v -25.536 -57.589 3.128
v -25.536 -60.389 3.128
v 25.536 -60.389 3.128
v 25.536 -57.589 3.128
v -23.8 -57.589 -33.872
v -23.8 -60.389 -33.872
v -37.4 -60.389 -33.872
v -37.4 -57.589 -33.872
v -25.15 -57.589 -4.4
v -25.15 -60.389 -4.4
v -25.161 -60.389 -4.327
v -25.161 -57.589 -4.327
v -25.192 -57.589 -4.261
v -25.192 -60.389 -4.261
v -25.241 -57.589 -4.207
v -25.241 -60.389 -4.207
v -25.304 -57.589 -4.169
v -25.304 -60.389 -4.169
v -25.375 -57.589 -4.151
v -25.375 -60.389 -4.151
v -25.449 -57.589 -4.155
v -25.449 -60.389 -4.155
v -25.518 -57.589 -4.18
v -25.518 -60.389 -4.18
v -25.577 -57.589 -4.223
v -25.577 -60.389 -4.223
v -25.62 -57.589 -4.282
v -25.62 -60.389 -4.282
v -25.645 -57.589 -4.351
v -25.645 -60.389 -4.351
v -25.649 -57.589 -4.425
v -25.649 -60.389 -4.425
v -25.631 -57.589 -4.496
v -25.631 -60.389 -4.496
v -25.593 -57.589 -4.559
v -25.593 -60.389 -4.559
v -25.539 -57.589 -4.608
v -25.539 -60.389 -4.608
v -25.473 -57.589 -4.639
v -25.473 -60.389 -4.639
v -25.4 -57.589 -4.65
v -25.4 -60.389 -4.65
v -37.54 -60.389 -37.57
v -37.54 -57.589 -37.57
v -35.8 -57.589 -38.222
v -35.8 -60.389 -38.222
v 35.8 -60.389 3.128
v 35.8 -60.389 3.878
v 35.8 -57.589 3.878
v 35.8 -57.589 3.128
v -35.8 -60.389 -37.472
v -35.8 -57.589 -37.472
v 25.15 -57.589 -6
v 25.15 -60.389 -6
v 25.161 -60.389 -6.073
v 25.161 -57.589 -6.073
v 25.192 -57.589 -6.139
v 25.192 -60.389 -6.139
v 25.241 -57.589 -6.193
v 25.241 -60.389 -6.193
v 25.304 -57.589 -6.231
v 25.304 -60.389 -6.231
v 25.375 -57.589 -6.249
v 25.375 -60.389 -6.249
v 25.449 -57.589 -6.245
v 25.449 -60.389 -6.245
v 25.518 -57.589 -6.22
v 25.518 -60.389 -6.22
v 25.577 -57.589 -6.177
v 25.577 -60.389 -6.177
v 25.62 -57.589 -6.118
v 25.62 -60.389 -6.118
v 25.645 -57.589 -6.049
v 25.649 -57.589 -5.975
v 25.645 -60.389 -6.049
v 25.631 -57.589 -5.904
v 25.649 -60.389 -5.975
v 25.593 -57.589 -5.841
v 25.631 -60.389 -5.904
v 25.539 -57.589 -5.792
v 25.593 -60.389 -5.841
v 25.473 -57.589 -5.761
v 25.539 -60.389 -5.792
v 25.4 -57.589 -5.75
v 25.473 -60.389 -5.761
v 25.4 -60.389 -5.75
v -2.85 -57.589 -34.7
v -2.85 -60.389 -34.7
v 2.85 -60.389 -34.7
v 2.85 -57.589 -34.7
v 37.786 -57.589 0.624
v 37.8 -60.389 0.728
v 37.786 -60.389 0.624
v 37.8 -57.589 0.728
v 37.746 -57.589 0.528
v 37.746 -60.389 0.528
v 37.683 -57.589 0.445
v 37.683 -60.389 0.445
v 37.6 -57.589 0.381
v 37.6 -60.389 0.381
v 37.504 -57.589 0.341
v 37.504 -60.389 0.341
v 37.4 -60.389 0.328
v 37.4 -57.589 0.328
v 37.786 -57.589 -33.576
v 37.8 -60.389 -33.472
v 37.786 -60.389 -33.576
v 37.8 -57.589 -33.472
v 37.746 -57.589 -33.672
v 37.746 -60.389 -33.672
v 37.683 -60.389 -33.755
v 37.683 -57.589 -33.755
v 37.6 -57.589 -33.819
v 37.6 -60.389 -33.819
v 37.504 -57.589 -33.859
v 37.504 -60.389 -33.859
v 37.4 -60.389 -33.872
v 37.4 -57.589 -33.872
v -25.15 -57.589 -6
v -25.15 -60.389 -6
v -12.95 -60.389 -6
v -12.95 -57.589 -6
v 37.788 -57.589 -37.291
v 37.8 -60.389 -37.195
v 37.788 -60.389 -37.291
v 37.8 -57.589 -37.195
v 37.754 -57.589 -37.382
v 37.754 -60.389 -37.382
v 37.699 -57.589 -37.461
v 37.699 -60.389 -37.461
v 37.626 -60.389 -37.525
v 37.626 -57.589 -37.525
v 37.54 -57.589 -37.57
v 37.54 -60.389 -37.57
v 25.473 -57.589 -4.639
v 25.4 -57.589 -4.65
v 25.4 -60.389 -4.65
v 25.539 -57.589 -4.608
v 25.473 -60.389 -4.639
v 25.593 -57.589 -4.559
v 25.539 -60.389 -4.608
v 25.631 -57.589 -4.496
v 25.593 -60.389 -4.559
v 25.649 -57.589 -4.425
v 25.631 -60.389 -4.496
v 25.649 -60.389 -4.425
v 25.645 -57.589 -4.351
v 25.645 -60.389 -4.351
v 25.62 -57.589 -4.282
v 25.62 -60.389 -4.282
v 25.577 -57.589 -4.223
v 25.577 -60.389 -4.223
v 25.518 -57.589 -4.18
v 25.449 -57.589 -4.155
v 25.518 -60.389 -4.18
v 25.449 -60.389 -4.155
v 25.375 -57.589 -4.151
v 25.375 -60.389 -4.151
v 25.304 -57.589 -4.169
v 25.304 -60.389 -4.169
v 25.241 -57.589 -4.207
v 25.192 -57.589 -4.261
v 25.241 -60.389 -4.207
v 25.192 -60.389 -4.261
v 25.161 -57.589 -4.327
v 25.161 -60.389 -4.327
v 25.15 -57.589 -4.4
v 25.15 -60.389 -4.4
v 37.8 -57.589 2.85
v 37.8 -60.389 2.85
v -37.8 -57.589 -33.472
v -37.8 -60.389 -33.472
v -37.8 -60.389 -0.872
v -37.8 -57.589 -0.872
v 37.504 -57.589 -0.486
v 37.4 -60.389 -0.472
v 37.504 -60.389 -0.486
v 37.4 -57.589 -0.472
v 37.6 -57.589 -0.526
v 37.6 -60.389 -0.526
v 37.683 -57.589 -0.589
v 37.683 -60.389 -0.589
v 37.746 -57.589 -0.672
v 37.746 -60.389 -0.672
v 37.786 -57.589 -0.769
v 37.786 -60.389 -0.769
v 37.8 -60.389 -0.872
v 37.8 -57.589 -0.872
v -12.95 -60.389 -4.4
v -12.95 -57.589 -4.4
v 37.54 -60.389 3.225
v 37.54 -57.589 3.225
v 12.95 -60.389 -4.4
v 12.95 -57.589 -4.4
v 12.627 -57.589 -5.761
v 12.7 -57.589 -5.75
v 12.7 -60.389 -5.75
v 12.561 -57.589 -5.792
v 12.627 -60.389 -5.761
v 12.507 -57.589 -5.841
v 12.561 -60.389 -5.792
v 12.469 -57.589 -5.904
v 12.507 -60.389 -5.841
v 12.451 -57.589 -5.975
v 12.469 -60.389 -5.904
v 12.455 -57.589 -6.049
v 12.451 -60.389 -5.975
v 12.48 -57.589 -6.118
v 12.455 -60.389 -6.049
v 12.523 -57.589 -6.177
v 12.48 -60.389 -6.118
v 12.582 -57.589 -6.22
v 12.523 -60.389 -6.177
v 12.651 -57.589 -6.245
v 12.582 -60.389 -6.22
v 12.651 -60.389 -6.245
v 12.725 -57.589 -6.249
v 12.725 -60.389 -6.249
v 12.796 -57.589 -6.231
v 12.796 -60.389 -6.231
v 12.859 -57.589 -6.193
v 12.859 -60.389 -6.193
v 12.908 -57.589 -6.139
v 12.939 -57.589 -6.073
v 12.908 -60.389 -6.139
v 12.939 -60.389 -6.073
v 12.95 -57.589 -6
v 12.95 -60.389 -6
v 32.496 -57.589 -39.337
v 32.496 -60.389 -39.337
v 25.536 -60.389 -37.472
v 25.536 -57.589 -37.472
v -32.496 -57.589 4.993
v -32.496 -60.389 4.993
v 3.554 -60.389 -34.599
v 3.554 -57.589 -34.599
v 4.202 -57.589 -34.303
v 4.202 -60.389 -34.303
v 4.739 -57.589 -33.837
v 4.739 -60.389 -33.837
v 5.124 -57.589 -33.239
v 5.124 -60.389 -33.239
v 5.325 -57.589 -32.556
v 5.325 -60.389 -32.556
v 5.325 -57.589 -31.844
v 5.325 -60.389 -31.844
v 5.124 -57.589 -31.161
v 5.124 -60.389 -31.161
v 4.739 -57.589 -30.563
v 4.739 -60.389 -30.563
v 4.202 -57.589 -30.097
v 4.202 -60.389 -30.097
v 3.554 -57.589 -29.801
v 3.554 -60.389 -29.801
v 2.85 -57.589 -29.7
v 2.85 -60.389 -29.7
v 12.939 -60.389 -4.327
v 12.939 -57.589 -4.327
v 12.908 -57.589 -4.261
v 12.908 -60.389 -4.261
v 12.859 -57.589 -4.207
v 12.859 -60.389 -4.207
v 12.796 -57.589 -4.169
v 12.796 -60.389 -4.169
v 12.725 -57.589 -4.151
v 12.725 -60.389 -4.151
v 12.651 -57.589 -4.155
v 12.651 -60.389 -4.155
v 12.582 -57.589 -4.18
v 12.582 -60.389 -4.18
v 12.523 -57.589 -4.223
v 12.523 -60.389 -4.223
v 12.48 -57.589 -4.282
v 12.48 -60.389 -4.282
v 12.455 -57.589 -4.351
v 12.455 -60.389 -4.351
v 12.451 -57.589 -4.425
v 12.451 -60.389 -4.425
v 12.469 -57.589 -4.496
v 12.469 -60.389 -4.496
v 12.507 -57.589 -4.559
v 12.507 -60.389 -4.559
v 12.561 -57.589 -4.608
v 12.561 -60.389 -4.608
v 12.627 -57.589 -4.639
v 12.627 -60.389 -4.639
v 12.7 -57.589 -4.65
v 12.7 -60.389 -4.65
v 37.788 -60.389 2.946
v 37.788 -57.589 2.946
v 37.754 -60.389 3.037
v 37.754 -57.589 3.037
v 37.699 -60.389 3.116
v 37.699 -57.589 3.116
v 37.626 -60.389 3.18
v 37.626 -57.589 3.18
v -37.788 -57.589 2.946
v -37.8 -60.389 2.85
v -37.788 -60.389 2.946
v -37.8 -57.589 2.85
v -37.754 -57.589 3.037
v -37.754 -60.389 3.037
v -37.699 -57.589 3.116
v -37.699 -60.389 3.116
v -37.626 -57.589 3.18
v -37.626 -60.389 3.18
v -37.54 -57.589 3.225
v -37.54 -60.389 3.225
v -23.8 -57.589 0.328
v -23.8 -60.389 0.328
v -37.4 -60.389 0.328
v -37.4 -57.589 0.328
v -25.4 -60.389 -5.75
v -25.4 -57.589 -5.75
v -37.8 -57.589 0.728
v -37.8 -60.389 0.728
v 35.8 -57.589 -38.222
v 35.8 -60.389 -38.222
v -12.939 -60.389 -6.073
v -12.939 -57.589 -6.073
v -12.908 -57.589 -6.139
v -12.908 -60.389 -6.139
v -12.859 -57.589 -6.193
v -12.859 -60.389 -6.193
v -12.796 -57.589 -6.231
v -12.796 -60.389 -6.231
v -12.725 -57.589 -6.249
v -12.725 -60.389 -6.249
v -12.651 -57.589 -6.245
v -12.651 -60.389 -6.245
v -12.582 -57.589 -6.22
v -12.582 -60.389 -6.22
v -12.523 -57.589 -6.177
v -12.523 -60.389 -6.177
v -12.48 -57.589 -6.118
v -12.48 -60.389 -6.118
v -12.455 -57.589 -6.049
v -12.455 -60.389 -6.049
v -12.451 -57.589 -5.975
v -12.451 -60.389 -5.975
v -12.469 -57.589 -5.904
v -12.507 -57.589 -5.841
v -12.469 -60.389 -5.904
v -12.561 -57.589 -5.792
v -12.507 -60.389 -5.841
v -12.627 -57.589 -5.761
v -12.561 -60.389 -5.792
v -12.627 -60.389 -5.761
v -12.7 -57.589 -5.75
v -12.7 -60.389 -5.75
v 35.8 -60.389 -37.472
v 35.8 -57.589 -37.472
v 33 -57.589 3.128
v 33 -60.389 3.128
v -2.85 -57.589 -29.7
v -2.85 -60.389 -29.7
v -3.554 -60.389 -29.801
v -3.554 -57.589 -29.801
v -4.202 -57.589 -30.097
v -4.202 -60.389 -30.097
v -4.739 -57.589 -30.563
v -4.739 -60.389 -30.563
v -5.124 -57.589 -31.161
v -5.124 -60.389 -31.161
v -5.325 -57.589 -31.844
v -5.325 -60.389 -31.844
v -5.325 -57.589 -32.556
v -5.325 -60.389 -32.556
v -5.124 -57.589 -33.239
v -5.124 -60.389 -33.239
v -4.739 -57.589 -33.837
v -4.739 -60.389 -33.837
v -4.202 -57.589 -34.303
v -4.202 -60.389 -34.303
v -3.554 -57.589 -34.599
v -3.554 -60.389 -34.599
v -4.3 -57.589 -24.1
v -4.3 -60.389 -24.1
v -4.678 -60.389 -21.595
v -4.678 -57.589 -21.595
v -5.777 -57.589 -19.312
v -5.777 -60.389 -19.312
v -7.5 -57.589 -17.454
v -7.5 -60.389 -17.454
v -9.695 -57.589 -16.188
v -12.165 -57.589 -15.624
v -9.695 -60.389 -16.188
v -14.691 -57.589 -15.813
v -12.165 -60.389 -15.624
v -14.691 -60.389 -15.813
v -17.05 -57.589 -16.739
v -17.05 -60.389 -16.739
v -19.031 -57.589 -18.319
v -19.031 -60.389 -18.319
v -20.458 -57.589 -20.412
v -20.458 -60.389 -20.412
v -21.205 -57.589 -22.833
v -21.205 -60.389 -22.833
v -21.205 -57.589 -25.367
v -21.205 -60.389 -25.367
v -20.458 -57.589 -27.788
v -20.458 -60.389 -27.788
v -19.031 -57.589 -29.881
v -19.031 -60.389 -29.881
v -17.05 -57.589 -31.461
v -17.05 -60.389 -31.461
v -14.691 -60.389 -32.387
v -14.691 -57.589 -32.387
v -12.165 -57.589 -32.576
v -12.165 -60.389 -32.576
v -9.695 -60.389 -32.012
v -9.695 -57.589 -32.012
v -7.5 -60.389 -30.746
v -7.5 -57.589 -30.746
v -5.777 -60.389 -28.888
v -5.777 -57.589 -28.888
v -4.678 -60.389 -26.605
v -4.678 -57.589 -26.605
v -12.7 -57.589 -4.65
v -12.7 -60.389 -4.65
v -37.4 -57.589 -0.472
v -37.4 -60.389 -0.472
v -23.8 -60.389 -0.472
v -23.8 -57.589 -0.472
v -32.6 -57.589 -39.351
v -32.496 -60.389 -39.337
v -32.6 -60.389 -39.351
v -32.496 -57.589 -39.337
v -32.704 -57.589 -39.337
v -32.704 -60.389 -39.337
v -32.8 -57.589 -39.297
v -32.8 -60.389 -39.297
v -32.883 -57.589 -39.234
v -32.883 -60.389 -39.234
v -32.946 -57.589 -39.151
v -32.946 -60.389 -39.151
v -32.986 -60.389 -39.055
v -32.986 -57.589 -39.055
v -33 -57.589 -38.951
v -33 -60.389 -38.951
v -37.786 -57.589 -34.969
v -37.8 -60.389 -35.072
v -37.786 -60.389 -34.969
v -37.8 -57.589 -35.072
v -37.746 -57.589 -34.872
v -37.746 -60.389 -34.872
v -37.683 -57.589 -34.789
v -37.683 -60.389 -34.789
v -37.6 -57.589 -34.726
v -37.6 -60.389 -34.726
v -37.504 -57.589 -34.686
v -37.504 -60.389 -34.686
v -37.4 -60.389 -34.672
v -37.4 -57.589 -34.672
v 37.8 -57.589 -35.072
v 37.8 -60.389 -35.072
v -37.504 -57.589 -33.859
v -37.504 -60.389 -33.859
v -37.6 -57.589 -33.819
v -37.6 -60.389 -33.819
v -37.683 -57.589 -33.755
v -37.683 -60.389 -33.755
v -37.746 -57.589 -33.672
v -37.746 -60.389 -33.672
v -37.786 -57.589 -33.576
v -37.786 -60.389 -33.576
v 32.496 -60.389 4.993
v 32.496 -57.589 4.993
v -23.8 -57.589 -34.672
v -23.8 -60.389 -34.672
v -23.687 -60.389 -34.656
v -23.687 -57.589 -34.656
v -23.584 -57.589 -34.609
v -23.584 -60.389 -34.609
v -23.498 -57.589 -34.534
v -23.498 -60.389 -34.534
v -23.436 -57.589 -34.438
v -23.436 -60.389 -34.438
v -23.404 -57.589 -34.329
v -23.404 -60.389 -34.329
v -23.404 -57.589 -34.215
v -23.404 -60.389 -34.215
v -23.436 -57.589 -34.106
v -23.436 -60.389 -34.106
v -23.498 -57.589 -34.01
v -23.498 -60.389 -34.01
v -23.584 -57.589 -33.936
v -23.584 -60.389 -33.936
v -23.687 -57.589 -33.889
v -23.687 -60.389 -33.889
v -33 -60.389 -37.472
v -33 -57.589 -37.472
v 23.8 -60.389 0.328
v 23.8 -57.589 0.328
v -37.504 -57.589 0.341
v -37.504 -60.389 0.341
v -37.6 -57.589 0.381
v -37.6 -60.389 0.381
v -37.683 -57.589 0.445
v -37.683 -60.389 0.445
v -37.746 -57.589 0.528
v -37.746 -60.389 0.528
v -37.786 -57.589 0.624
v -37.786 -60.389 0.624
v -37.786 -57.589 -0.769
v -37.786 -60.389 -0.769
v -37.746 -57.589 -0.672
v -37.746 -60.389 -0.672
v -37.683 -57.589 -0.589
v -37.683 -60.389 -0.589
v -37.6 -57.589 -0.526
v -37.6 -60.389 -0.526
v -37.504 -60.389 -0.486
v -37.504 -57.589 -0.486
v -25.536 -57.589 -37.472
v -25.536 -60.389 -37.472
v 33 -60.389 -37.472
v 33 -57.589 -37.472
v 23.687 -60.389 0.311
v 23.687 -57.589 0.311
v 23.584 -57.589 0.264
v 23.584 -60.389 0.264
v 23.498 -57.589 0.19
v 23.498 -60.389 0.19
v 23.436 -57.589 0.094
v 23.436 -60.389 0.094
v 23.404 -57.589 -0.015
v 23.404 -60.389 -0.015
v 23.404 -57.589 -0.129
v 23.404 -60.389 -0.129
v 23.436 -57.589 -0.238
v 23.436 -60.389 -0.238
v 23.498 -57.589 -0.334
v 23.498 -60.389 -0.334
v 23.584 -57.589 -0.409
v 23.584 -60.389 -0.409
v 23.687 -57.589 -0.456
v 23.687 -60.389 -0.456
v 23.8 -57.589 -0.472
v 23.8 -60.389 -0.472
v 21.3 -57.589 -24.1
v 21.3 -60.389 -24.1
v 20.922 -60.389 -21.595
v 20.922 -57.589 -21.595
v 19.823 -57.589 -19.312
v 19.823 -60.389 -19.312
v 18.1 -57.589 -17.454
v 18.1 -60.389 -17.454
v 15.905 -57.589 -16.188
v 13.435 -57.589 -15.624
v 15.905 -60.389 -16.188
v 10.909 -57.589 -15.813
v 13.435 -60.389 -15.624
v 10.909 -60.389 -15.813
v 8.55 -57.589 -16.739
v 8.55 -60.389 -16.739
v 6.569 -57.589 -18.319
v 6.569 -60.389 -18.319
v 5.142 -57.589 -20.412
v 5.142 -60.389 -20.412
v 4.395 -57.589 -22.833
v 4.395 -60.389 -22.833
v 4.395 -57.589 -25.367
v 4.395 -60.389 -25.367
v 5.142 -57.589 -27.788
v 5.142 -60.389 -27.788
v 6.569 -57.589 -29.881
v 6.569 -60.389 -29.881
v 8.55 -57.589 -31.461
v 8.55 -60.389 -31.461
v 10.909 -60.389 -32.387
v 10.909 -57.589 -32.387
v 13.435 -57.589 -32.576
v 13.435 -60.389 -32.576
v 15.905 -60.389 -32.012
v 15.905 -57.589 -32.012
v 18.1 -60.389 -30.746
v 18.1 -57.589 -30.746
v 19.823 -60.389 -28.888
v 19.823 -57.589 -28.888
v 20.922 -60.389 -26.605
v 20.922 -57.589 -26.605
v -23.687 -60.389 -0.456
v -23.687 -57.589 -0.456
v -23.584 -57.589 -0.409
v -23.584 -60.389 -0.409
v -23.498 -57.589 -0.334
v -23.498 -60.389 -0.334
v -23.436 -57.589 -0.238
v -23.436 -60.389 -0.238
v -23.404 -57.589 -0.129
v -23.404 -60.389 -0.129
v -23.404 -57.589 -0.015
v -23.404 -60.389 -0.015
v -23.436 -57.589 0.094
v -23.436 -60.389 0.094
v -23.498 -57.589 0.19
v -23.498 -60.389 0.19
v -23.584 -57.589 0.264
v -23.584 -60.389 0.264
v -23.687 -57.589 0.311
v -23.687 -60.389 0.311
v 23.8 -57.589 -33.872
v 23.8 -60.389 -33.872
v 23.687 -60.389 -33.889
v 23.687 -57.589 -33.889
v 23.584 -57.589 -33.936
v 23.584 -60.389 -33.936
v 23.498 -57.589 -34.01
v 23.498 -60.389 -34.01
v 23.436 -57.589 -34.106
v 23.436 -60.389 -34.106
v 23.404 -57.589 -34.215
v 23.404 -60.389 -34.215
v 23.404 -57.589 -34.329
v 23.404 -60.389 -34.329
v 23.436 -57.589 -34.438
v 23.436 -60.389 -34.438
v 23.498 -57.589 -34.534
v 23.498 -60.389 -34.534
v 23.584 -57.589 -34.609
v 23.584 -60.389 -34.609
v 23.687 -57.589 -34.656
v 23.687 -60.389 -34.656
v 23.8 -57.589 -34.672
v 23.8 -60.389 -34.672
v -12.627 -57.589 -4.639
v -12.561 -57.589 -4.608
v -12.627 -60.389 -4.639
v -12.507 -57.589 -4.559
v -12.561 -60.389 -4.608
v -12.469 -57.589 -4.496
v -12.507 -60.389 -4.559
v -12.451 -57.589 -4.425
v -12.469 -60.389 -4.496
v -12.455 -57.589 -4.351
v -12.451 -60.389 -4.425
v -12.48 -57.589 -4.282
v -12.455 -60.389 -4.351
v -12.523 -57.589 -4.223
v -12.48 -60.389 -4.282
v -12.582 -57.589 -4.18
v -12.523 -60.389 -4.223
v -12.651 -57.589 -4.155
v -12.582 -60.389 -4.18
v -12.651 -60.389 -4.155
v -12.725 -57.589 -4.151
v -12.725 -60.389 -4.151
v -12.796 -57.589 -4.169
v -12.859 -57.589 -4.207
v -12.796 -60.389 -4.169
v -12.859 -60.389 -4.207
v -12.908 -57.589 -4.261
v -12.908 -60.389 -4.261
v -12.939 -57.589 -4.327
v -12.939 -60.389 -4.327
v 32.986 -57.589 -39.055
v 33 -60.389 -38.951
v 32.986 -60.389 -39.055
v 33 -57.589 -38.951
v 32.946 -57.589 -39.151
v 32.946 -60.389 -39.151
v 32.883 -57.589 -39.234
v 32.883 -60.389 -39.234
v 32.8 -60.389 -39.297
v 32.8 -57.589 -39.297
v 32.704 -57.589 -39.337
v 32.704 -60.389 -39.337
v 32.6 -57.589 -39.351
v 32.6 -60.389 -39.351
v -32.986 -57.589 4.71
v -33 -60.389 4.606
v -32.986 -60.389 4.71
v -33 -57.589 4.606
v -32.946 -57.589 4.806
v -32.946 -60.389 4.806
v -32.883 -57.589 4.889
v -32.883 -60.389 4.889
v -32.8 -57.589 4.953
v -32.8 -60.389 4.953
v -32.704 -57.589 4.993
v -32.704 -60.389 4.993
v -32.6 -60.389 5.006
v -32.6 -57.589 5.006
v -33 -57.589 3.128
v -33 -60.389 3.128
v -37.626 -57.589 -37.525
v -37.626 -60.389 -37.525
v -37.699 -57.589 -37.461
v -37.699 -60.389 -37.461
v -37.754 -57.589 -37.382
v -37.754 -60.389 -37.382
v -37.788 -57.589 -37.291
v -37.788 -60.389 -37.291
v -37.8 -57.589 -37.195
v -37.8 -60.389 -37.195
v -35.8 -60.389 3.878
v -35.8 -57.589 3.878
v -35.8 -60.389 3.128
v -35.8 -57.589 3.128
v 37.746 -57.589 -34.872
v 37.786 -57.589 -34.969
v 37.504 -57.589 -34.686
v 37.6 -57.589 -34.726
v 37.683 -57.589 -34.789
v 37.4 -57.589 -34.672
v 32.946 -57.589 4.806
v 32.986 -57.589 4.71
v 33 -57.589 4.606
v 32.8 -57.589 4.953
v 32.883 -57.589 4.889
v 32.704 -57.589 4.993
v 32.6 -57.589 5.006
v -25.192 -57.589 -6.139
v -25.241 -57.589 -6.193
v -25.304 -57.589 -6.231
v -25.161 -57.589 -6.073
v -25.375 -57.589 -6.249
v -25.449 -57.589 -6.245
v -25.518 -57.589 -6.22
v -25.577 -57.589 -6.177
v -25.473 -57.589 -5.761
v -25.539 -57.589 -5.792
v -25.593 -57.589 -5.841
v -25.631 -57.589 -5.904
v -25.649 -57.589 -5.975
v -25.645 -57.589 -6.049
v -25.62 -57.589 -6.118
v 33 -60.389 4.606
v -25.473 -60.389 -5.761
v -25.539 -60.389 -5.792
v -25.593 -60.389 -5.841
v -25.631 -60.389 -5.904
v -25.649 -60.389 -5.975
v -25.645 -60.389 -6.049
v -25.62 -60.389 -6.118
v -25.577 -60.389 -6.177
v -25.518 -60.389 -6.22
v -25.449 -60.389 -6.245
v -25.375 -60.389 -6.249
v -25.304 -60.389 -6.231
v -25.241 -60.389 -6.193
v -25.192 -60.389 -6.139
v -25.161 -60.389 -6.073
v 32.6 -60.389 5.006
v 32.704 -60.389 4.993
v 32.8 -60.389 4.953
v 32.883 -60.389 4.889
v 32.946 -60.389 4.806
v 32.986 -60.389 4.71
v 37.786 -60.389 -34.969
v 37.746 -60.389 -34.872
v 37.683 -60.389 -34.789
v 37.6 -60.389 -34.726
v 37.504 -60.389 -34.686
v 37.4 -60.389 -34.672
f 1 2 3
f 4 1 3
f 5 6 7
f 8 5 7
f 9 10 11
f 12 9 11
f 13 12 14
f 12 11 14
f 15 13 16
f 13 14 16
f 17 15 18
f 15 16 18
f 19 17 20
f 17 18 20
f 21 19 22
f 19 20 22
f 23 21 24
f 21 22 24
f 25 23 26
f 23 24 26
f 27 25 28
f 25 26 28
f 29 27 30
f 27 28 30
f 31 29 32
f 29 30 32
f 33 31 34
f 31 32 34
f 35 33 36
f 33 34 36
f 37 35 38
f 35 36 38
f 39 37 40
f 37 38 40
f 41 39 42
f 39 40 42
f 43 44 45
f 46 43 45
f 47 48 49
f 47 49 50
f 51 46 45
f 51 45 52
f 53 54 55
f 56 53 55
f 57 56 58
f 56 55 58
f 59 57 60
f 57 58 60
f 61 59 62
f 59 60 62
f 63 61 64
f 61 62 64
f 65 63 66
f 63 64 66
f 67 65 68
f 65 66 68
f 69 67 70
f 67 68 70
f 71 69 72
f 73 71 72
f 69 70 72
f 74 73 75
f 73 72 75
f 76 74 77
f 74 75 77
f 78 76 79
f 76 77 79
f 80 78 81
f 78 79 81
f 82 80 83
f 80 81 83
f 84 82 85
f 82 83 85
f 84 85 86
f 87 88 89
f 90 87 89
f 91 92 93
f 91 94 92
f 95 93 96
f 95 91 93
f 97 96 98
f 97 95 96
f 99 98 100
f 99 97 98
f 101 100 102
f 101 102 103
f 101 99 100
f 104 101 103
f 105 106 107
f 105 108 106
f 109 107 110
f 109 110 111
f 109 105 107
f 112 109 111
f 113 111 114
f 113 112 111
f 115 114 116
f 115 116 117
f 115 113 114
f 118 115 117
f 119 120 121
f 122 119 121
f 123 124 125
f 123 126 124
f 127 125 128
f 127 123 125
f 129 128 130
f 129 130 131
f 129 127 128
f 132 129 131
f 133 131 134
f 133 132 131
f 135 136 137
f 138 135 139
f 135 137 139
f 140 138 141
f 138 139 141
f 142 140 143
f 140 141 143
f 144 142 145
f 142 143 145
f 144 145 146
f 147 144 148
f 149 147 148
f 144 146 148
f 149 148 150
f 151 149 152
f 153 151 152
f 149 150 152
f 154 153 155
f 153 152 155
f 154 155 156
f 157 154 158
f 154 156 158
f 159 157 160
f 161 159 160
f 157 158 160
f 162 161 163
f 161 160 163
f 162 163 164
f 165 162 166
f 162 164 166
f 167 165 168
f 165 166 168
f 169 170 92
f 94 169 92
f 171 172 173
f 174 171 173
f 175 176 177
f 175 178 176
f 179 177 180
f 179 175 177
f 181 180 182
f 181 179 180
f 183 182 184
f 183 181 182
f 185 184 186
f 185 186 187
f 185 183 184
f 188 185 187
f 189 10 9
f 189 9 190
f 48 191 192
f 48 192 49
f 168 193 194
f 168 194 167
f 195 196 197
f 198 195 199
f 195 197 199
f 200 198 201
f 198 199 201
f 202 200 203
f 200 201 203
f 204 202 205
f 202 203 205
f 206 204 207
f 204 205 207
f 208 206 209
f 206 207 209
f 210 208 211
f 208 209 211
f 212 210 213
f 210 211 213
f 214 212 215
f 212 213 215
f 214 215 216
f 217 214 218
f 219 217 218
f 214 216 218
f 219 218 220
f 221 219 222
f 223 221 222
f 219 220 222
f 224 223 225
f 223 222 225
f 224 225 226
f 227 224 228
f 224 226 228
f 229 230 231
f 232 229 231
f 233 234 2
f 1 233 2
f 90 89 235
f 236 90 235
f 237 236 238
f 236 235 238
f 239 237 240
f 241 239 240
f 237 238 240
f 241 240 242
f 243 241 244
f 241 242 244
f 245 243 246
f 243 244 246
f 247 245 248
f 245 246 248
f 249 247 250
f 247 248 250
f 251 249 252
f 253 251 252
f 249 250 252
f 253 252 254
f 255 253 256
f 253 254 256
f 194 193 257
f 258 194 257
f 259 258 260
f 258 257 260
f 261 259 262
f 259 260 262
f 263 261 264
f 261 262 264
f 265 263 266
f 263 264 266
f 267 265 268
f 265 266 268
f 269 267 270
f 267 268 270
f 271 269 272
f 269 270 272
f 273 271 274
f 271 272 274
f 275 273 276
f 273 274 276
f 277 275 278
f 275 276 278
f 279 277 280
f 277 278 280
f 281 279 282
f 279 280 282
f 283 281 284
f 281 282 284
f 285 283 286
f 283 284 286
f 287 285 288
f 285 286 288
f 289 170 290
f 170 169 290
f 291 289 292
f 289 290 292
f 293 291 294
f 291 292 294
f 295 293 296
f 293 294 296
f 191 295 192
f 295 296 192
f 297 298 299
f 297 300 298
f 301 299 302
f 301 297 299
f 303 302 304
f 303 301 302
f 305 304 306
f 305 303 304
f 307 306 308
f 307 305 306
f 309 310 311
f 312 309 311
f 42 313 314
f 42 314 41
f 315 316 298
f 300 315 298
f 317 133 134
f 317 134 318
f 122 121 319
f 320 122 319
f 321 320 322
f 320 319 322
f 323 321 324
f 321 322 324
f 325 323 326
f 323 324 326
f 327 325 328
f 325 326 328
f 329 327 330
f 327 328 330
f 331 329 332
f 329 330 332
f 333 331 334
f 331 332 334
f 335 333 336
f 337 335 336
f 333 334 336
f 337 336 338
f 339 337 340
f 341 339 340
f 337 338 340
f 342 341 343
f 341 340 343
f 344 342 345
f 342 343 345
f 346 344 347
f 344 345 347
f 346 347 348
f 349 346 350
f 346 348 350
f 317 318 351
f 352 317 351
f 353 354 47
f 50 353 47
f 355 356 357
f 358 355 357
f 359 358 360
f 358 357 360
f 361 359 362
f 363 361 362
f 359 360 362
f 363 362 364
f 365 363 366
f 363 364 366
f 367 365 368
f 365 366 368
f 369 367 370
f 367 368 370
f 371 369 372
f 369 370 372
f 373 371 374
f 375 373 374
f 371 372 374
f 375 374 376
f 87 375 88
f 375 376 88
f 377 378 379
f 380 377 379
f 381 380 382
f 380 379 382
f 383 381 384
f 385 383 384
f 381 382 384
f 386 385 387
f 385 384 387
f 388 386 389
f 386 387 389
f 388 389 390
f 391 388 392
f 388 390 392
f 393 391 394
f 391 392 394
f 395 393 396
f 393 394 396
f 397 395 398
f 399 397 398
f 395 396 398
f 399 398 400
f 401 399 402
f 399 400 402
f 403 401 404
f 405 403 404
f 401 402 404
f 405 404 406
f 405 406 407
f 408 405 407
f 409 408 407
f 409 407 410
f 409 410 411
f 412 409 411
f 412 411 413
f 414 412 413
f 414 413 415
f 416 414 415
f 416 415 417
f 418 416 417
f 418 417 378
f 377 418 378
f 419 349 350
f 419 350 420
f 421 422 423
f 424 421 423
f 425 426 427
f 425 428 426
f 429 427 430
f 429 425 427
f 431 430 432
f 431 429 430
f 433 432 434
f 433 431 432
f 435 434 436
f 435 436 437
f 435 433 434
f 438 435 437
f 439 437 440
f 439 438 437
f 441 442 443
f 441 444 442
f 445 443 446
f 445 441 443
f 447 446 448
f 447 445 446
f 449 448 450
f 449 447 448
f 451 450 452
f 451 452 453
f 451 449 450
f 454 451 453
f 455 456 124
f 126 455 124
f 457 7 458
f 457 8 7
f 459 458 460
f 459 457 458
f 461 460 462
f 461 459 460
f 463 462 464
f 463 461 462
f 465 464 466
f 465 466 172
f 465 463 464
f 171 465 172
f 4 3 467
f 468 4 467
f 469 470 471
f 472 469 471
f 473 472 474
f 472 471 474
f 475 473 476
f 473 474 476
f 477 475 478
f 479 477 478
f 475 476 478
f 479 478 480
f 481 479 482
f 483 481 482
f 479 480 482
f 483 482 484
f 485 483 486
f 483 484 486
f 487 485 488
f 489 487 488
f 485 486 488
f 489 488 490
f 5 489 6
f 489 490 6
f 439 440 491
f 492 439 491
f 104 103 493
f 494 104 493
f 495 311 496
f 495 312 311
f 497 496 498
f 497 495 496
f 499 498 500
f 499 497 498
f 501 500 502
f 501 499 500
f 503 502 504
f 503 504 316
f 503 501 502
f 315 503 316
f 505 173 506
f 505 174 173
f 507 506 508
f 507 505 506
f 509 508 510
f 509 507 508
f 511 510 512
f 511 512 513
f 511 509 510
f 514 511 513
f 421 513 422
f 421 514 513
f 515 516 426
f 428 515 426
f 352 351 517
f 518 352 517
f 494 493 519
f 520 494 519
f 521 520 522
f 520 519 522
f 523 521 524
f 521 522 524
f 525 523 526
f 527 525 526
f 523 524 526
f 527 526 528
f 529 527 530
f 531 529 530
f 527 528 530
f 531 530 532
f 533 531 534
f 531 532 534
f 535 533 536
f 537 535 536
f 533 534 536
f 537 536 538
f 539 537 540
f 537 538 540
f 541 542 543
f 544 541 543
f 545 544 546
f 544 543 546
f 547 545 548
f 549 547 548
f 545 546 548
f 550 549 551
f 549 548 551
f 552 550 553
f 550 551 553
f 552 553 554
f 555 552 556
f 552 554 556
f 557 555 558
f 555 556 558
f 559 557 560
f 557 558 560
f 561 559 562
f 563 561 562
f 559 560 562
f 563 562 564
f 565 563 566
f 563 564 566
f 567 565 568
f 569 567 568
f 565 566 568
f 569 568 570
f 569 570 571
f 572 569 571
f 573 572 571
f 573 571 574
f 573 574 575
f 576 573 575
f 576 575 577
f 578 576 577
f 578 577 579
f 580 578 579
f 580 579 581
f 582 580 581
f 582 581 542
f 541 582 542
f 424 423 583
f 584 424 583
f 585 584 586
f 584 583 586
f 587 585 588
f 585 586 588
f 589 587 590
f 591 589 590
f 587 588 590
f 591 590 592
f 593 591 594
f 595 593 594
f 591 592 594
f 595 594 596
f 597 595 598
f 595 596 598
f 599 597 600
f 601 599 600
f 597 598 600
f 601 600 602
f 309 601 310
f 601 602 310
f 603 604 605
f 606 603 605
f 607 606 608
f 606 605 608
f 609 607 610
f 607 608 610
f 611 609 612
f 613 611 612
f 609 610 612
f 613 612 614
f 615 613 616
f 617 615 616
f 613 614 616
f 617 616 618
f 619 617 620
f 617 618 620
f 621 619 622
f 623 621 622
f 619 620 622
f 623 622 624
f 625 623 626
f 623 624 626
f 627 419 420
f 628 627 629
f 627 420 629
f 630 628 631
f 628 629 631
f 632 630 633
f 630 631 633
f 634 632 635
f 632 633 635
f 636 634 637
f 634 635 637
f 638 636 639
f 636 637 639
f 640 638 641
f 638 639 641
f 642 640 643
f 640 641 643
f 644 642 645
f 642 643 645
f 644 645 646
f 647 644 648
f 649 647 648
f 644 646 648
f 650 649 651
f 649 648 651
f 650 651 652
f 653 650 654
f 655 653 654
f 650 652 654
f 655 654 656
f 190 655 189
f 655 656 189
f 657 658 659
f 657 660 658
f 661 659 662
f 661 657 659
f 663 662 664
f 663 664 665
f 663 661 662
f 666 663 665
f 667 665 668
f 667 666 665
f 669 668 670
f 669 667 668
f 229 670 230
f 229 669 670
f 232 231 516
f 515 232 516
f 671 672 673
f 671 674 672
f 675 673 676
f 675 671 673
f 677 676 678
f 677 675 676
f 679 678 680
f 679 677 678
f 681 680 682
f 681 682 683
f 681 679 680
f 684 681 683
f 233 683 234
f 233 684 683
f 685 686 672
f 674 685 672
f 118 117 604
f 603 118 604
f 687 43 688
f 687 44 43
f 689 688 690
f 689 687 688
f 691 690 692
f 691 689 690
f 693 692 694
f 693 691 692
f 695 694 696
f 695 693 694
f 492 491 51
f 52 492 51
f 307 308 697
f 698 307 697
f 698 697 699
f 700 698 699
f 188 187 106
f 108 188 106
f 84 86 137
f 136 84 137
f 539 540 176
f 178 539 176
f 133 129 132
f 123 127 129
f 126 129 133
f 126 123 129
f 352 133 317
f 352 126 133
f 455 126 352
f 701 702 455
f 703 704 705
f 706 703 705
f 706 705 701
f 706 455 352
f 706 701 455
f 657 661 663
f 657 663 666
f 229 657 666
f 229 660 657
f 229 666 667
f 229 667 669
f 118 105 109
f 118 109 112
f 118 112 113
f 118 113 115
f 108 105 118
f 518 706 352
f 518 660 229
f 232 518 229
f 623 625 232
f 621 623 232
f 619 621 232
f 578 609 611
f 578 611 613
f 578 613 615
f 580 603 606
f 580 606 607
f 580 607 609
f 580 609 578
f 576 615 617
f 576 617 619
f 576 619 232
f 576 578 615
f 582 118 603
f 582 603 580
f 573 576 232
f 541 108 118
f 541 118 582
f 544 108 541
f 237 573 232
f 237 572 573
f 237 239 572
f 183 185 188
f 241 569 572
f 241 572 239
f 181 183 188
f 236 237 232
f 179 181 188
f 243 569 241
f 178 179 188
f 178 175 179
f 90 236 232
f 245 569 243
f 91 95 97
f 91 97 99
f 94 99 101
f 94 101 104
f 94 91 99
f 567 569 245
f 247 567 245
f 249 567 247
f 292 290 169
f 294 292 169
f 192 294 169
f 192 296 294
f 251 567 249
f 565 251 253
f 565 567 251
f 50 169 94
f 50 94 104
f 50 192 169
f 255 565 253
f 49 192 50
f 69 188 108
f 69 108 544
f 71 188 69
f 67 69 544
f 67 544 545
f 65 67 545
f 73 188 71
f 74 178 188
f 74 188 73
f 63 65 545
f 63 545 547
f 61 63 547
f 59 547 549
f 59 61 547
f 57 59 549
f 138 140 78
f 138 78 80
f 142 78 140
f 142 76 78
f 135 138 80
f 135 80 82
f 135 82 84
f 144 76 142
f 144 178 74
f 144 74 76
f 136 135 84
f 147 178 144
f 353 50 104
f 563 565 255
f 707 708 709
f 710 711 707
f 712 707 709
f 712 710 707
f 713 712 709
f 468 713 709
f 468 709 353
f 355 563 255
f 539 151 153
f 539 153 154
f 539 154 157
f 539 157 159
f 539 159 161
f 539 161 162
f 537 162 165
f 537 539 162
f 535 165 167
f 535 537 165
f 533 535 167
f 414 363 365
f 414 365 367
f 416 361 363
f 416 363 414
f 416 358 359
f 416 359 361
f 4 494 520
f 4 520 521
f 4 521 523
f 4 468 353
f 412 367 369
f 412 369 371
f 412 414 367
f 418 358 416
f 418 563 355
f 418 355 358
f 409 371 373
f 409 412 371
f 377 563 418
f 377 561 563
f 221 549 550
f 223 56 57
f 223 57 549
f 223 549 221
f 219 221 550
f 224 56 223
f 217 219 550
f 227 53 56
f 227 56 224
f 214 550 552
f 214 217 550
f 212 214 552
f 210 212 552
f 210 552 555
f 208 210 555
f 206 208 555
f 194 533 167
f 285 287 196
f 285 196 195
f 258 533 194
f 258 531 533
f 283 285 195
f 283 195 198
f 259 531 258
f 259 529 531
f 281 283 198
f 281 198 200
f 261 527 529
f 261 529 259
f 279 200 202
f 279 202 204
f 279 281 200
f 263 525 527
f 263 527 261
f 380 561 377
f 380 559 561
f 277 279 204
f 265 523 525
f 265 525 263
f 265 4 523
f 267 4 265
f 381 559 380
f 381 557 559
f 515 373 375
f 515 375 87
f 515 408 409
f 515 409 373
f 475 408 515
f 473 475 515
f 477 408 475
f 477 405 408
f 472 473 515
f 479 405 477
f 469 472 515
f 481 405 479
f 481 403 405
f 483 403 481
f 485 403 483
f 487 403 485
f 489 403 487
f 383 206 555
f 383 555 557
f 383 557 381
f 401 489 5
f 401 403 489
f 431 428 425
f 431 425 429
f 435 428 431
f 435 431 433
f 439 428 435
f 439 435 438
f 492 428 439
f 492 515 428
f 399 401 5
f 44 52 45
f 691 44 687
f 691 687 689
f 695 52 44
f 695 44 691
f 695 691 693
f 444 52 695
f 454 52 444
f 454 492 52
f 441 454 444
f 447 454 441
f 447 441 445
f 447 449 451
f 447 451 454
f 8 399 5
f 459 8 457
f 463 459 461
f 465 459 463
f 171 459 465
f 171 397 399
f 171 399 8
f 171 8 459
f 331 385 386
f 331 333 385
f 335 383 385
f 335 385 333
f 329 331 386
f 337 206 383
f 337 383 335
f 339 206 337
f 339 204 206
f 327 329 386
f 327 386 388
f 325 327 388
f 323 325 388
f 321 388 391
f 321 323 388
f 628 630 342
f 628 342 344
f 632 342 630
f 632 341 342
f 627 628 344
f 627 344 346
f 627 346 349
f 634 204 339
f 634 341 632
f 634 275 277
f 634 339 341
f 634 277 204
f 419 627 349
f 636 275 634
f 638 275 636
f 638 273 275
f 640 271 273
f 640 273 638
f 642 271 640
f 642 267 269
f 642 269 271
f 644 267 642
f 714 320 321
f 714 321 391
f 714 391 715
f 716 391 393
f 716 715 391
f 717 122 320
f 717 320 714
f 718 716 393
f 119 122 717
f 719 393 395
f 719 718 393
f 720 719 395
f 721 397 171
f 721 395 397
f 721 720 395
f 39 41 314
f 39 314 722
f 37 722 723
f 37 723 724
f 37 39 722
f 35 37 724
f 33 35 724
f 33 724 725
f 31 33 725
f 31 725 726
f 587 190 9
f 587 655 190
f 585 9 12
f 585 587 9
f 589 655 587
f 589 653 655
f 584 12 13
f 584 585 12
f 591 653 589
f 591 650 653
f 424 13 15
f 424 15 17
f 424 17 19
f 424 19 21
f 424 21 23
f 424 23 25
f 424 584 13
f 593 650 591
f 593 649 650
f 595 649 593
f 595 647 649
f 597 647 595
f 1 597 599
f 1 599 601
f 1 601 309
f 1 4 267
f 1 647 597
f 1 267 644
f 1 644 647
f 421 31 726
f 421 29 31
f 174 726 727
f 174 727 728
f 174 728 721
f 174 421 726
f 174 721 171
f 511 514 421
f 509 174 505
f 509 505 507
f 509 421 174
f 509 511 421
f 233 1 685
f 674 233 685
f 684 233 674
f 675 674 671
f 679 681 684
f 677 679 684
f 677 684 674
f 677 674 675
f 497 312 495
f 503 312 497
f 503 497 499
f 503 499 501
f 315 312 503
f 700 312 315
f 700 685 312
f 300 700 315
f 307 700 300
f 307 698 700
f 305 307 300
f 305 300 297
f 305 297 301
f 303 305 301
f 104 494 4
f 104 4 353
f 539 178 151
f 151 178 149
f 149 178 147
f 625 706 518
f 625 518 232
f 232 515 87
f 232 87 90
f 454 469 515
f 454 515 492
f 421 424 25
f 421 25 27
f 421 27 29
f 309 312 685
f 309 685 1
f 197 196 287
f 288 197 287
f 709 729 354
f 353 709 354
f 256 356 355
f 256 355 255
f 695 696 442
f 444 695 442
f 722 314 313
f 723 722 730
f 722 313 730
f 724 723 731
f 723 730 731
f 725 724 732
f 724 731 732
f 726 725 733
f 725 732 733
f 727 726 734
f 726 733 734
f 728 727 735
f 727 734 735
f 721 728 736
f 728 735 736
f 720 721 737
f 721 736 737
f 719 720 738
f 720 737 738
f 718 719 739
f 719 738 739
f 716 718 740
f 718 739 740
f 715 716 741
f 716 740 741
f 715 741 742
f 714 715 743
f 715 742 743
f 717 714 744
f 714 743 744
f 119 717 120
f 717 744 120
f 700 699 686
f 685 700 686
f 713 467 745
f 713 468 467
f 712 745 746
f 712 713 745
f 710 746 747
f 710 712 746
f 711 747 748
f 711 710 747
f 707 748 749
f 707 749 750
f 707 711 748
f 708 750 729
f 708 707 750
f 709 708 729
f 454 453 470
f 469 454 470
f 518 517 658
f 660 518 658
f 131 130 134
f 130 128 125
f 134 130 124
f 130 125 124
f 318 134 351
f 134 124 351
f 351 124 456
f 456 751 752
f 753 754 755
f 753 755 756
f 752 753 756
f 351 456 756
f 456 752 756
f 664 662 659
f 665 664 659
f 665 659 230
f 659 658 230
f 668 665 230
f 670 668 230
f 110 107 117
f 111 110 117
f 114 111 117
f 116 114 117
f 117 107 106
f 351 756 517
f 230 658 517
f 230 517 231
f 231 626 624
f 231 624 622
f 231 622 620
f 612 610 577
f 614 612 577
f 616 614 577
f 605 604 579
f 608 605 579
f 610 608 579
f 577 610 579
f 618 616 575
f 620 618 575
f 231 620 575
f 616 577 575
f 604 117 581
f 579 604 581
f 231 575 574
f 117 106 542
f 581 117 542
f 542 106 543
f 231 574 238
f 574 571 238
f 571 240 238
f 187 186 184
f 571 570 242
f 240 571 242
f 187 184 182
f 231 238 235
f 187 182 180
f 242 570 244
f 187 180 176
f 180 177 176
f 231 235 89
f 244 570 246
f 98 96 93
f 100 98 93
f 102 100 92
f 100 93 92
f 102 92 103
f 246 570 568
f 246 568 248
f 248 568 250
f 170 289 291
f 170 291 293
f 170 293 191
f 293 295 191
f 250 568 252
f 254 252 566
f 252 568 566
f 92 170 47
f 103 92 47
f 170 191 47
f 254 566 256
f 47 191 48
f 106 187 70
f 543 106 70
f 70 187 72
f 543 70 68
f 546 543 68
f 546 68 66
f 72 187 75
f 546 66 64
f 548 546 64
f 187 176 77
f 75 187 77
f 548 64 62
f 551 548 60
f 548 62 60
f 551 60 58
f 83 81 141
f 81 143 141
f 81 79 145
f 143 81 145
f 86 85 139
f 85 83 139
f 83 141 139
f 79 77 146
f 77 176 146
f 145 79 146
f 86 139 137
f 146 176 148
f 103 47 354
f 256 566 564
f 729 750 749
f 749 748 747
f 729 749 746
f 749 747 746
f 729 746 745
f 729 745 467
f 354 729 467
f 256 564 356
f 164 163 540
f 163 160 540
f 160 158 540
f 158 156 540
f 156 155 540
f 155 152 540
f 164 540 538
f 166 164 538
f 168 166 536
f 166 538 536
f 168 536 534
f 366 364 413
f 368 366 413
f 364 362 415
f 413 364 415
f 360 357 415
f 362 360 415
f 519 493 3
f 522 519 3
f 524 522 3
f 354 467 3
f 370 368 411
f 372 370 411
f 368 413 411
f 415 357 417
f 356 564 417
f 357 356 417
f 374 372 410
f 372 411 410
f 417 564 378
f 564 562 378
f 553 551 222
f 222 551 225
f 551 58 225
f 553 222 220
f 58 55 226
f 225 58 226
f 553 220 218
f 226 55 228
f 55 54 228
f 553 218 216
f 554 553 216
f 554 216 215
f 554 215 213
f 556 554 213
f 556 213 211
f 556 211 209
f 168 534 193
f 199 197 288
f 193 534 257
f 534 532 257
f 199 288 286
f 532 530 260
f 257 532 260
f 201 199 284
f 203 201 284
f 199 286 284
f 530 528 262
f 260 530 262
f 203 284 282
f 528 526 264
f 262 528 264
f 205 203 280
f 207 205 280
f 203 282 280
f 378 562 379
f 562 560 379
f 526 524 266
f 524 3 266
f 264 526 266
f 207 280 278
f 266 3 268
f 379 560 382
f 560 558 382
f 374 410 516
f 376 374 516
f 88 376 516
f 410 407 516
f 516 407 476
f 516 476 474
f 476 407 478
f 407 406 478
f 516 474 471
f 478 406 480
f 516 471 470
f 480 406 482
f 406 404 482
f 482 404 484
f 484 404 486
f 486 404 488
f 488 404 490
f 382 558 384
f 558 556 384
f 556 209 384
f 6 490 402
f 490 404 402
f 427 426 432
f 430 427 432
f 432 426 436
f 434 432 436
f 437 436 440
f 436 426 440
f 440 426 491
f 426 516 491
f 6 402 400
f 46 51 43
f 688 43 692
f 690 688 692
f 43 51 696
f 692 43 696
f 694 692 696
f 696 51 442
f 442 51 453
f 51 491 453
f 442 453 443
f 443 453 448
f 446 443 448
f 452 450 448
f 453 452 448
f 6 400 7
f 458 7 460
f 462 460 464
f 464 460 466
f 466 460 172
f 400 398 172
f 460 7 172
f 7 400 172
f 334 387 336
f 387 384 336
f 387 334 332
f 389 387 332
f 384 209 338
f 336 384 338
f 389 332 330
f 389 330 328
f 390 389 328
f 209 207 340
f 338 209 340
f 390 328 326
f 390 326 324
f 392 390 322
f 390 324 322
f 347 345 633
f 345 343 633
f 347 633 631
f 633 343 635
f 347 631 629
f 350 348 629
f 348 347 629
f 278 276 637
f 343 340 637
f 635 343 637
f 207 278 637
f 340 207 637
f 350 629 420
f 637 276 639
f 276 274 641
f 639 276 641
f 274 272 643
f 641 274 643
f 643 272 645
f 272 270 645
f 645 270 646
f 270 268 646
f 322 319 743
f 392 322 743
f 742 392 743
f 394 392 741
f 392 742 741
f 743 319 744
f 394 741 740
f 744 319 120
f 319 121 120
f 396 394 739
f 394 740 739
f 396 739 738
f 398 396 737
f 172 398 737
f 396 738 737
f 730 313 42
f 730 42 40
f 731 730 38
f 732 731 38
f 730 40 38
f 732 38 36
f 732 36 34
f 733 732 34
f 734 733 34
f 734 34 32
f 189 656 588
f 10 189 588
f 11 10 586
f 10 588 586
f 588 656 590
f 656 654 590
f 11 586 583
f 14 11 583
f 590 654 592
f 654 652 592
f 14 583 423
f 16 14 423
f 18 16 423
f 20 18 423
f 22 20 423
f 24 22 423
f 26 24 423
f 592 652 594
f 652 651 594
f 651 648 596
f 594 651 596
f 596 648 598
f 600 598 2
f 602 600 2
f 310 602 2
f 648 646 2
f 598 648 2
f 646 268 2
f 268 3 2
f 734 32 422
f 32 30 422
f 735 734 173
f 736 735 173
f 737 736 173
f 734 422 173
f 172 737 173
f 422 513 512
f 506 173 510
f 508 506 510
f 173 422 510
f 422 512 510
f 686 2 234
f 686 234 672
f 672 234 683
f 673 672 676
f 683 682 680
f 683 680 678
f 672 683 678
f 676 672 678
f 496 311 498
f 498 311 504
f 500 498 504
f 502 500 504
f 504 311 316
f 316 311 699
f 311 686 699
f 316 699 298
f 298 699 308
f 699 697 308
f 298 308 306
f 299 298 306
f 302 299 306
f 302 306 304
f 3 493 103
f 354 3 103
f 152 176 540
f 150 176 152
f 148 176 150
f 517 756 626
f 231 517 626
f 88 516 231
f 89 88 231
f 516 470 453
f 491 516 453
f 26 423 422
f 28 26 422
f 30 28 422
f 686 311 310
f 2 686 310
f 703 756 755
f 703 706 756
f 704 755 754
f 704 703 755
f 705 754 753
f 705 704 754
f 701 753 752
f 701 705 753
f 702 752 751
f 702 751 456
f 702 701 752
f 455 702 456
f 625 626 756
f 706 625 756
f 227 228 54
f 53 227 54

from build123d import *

# Parameters (mm, degrees)
PAD009_DEPTH    = 2.8
FILLET004_R     = 0.4
SKETCH025_W     = 12.7
SKETCH025_H     = 1.6
POCKET014_DEPTH = 2.801
SKETCH026_R     = 0.25
POCKET015_DEPTH = 2.801
SKETCH028_R     = 8.5
POCKET017_DEPTH = 2.801


with BuildPart() as part:
    # Sketch009 (on Face6 of ShapeBinder008) → Pad009 (new body)
    with BuildSketch(Plane.XZ.offset(60.388718)):
        with BuildLine():
            Line((37.8, 3.127675), (37.8, 0.327675))
            Line((37.8, 0.327675), (23.8, 0.327675))
            ThreePointArc((23.8, 0.327675), (23.4, -0.072325), (23.8, -0.472325))
            Line((23.8, -0.472325), (37.8, -0.472325))
            Line((37.8, -0.472325), (37.8, -33.872325))
            Line((37.8, -33.872325), (23.8, -33.872325))
            ThreePointArc((23.8, -33.872325), (23.4, -34.272325), (23.8, -34.672325))
            Line((23.8, -34.672325), (37.8, -34.672325))
            Line((37.8, -34.672325), (37.8, -37.472325))
            Line((37.8, -37.472325), (35.8, -38.222325))
            Line((35.8, -38.222325), (35.8, -37.472325))
            Line((35.8, -37.472325), (33, -37.472325))
            Line((33, -37.472325), (33, -39.472325))
            Line((33, -39.472325), (25.535898, -37.472325))
            Line((25.535898, -37.472325), (-25.535898, -37.472325))
            Line((-25.535898, -37.472325), (-33, -39.472325))
            Line((-33, -39.472325), (-33, -37.472325))
            Line((-33, -37.472325), (-35.8, -37.472325))
            Line((-35.8, -38.222325), (-35.8, -37.472325))
            Line((-37.8, -37.472325), (-35.8, -38.222325))
            Line((-37.8, -37.472325), (-37.8, -34.672325))
            Line((-37.8, -34.672325), (-23.8, -34.672325))
            ThreePointArc((-23.8, -34.672325), (-23.4, -34.272325), (-23.8, -33.872325))
            Line((-23.8, -33.872325), (-37.8, -33.872325))
            Line((-37.8, -33.872325), (-37.8, -0.472325))
            Line((-37.8, -0.472325), (-23.8, -0.472325))
            ThreePointArc((-23.8, -0.472325), (-23.4, -0.072325), (-23.8, 0.327675))
            Line((-23.8, 0.327675), (-37.8, 0.327675))
            Line((-37.8, 0.327675), (-37.8, 3.127675))
            Line((-37.8, 3.127675), (-35.8, 3.877675))
            Line((-35.8, 3.877675), (-35.8, 3.127675))
            Line((-35.8, 3.127675), (-33, 3.127675))
            Line((-33, 3.127675), (-33, 5.127675))
            Line((-33, 5.127675), (-25.535898, 3.127675))
            Line((-25.535898, 3.127675), (25.535898, 3.127675))
            Line((25.535898, 3.127675), (33, 5.127675))
            Line((33, 5.127675), (33, 3.127675))
            Line((33, 3.127675), (35.8, 3.127675))
            Line((35.8, 3.877675), (35.8, 3.127675))
            Line((37.8, 3.127675), (35.8, 3.877675))
        make_face()
    extrude(amount=-PAD009_DEPTH)

    # Fillet004
    fillet004_edges = [part.edges().sort_by_distance(p)[0] for p in [
        (33, -58.988718, 5.127675),
        (37.8, -58.988718, 3.127675),
        (37.8, -58.988718, 0.327675),
        (37.8, -58.988718, -0.472325),
        (37.8, -58.988718, -33.872325),
        (37.8, -58.988718, -34.672325),
        (37.8, -58.988718, -37.472325),
        (33, -58.988718, -39.472325),
        (-37.8, -58.988718, -33.872325),
        (-37.8, -58.988718, -34.672325),
        (-37.8, -58.988718, -37.472325),
        (-33, -58.988718, -39.472325),
        (-33, -58.988718, 5.127675),
        (-37.8, -58.988718, 3.127675),
        (-37.8, -58.988718, 0.327675),
        (-37.8, -58.988718, -0.472325),
    ]]
    fillet(fillet004_edges, radius=FILLET004_R)

    # Sketch025 (on Face2 of Fillet004) → Pocket014 (cut, through all)
    with BuildSketch(Plane.XZ.offset(60.388718)):
        with Locations((-19.05, -5.2)):
            Rectangle(SKETCH025_W, SKETCH025_H)
        with Locations((19.05, -5.2)):
            Rectangle(SKETCH025_W, SKETCH025_H)
    extrude(amount=-POCKET014_DEPTH, mode=Mode.SUBTRACT)

    # Sketch026 (on Face2 of Pocket014) → Pocket015 (cut, through all)
    with BuildSketch(Plane.XZ.offset(60.388718)):
        with Locations((-25.4, -4.4)):
            Circle(SKETCH026_R)
        with Locations((-12.7, -4.4)):
            Circle(SKETCH026_R)
        with Locations((-12.7, -6)):
            Circle(SKETCH026_R)
        with Locations((-25.4, -6)):
            Circle(SKETCH026_R)
        with Locations((12.7, -4.4)):
            Circle(SKETCH026_R)
        with Locations((12.7, -6)):
            Circle(SKETCH026_R)
        with Locations((25.4, -4.4)):
            Circle(SKETCH026_R)
        with Locations((25.4, -6)):
            Circle(SKETCH026_R)
    extrude(amount=-POCKET015_DEPTH, mode=Mode.SUBTRACT)

    # Sketch028 (on Face2 of Pocket015) → Pocket017 (cut, through all)
    with BuildSketch(Plane.XZ.offset(60.388718)):
        with Locations((-12.8, -24.1)):
            Circle(SKETCH028_R)
        with Locations((12.8, -24.1)):
            Circle(SKETCH028_R)
        with BuildLine():
            ThreePointArc((-2.85, -29.7), (-5.35, -32.2), (-2.85, -34.7))
            Line((-2.85, -34.7), (2.85, -34.7))
            ThreePointArc((2.85, -34.7), (5.35, -32.2), (2.85, -29.7))
            Line((-2.85, -29.7), (2.85, -29.7))
        make_face()
    extrude(amount=-POCKET017_DEPTH, mode=Mode.SUBTRACT)


solid = part.part
